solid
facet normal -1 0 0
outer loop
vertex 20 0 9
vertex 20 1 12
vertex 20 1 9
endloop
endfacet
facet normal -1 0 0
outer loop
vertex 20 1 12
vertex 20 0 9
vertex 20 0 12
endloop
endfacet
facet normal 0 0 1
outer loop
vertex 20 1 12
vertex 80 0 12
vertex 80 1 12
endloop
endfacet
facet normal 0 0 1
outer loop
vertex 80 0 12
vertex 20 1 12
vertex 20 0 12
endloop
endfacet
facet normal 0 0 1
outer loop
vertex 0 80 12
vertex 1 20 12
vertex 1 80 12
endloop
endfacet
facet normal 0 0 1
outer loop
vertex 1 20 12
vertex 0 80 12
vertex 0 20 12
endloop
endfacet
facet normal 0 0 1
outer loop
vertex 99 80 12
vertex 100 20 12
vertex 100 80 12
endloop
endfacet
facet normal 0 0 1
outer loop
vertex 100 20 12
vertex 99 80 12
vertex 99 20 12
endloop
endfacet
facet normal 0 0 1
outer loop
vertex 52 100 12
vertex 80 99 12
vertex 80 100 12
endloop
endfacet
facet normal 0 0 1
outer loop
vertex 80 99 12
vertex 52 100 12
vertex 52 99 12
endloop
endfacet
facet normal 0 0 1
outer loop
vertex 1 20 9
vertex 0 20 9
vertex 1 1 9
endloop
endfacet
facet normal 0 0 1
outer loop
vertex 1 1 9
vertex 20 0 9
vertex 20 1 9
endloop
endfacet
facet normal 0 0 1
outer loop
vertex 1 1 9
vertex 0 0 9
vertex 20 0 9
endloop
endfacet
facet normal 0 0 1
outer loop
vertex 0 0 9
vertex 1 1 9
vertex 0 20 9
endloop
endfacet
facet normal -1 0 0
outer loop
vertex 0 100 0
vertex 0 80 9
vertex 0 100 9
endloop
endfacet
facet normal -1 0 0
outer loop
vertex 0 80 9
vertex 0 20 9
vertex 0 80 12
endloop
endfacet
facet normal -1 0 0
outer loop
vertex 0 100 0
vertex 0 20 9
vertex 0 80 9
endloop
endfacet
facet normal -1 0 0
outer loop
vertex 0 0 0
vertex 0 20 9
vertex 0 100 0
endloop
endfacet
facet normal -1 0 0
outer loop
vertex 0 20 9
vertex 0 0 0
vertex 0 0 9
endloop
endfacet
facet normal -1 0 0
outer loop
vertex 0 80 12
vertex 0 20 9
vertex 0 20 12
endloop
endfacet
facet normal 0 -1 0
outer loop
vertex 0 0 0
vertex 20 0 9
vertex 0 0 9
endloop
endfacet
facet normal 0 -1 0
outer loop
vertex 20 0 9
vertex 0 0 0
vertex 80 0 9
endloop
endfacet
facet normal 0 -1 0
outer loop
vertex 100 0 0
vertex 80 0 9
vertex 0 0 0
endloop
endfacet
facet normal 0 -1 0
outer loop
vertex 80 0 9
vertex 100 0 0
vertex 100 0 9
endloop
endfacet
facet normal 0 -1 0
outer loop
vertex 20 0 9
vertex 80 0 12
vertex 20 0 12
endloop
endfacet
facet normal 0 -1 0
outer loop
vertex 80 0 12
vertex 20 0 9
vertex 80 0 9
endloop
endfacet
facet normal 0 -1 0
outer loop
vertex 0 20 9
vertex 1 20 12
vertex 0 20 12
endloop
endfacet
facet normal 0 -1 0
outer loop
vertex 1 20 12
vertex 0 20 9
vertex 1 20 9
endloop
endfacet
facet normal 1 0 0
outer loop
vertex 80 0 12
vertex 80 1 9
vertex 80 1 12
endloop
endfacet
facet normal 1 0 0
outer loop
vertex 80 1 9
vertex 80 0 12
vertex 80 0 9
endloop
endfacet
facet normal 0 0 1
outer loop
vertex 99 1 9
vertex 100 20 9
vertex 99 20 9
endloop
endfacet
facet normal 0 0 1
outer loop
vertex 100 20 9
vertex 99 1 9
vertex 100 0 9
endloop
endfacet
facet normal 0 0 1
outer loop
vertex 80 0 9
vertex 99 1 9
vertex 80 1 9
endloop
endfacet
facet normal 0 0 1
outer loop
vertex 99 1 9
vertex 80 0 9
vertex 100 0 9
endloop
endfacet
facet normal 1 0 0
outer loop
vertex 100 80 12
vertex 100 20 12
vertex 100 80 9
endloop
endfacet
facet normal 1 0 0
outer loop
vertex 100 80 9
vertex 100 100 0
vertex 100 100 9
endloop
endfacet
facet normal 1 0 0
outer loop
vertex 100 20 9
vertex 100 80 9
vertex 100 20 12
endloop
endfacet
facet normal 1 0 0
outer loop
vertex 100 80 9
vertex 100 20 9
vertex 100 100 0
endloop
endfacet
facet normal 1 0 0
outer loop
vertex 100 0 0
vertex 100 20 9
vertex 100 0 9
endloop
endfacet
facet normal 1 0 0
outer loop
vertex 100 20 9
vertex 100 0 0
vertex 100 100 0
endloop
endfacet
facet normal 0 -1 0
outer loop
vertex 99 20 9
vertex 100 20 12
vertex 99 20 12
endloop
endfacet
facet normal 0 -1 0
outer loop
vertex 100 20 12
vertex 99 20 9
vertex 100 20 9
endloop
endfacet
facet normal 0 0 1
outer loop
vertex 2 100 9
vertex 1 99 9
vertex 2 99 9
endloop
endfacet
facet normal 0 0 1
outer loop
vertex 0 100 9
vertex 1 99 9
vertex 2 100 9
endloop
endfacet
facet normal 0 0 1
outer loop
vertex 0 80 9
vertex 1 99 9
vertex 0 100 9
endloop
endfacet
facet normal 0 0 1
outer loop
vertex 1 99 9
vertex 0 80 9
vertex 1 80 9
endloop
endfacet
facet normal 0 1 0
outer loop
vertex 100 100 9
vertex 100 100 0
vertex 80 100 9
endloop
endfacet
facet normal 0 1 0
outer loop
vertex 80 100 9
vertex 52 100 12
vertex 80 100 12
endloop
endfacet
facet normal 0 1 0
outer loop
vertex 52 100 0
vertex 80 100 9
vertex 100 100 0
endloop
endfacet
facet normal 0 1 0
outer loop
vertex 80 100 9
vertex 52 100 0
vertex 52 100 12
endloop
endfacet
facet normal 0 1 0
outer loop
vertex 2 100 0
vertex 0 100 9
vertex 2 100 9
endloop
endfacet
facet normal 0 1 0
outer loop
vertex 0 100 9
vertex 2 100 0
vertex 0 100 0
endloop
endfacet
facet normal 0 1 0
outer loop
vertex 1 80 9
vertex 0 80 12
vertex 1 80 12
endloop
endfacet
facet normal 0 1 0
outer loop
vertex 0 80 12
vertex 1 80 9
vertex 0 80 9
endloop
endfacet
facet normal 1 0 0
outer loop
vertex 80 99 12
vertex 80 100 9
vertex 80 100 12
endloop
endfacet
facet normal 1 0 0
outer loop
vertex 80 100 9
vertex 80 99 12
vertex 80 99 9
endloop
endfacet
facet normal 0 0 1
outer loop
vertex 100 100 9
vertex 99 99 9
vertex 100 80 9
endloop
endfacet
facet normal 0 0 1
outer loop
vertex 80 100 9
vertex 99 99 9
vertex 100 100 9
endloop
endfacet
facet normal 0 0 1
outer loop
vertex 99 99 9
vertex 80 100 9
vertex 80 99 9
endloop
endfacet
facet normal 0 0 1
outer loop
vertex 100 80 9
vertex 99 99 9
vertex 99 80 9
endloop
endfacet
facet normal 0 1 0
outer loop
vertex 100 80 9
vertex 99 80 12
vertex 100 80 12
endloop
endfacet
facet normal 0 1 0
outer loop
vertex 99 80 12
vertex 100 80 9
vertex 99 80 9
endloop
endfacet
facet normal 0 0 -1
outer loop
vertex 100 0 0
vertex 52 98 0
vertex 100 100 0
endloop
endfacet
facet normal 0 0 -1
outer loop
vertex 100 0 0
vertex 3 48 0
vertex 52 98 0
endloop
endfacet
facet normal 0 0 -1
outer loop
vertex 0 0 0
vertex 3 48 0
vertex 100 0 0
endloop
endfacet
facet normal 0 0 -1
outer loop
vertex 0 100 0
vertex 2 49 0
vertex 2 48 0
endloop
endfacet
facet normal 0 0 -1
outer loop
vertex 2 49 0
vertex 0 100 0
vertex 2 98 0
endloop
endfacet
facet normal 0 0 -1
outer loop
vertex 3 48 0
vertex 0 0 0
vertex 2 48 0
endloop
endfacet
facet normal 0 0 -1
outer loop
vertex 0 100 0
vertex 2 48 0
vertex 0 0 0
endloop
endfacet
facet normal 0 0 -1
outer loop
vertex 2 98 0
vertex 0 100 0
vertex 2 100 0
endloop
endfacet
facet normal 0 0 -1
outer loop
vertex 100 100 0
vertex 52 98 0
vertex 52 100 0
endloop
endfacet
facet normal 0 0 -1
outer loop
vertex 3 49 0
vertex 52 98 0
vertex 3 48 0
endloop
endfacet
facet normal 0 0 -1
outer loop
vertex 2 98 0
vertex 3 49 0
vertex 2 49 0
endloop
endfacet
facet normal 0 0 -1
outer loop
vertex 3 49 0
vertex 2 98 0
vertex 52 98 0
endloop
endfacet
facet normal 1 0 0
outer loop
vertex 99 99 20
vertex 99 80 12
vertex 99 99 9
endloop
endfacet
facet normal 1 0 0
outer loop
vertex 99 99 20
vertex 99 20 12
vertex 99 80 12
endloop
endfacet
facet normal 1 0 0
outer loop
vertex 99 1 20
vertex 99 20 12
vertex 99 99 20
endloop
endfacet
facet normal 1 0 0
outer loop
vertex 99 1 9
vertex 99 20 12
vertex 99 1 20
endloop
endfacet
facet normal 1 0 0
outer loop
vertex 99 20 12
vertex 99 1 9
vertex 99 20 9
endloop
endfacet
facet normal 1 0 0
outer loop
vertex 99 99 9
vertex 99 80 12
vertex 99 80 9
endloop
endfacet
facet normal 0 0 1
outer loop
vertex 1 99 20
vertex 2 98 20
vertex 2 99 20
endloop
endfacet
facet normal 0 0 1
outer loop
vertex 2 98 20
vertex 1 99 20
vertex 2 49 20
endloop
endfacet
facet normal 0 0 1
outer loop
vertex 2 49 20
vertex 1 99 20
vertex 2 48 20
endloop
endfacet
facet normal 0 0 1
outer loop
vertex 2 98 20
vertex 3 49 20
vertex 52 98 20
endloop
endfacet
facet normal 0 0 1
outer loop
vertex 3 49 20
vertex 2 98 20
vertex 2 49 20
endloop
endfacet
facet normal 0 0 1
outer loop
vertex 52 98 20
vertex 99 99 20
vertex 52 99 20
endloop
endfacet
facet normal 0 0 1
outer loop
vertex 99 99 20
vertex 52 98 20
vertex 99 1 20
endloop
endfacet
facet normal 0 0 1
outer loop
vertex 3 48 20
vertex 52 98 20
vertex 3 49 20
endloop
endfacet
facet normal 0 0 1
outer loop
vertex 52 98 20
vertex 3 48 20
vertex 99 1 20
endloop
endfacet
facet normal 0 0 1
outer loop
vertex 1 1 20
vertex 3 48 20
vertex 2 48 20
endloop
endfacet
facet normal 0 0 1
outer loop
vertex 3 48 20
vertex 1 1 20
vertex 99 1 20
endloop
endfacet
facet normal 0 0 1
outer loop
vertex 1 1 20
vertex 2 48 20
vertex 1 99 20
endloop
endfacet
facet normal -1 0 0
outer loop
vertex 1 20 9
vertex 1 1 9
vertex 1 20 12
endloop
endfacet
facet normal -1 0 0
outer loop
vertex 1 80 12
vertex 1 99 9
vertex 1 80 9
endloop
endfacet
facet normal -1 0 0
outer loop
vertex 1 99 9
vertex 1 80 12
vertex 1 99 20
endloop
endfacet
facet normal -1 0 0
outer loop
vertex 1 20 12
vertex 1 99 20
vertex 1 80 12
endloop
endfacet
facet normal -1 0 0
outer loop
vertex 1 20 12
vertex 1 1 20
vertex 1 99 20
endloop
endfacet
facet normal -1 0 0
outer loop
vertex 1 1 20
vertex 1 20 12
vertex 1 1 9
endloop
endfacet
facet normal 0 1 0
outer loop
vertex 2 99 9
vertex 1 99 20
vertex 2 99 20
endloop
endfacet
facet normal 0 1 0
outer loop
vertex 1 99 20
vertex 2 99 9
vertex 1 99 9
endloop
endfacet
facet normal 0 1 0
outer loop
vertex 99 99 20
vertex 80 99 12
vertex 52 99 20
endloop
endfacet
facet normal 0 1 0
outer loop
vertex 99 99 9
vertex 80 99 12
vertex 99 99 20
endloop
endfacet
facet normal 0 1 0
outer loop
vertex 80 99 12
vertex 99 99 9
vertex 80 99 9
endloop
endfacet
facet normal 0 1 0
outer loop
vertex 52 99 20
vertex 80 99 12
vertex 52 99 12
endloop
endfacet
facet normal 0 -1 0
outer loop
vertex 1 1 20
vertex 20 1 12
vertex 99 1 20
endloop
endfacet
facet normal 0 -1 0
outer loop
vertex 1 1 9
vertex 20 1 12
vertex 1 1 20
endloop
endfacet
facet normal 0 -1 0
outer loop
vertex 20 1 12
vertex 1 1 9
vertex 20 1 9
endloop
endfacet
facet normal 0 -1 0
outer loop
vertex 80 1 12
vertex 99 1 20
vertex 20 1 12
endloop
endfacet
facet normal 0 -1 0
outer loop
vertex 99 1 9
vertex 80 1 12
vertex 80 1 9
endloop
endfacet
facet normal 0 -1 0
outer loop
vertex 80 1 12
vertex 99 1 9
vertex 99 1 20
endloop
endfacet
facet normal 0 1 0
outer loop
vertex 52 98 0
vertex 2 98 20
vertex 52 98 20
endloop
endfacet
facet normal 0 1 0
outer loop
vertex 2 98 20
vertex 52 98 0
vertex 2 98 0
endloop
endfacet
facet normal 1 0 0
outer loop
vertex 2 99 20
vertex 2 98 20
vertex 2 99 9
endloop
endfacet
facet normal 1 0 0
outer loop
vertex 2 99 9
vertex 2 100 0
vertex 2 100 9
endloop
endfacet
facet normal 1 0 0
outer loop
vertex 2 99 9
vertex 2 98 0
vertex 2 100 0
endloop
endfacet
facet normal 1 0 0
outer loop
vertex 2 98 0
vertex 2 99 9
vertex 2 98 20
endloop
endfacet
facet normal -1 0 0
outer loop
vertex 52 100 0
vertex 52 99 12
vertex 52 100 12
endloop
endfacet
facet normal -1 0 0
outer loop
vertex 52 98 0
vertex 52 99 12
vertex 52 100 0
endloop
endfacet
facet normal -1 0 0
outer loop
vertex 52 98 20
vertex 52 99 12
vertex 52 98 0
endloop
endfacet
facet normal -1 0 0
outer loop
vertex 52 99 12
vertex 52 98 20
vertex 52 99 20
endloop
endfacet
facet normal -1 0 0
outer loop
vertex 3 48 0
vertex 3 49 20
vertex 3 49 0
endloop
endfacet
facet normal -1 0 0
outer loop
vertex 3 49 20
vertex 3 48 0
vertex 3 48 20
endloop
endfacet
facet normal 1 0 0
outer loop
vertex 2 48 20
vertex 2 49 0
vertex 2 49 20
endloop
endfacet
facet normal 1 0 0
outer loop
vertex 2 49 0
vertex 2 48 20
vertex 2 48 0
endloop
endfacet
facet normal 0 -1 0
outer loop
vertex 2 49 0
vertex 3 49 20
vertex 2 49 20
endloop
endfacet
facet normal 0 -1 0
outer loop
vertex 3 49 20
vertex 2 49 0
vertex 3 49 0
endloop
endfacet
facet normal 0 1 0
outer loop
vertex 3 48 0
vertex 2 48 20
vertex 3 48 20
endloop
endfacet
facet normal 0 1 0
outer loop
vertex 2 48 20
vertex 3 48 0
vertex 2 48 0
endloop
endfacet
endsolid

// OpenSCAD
include <boardgame_insert_toolkit_lib.scad>;


data =
[
    [   "a card box",
        [
            [ "box_dimensions",                             [100.0, 100.0, 20.0] ],      // float f -- default:[ 100, 100, 100]
            [ "enabled",                                    true ],

            [   "components",
                [
                    [   "cards",
                        [
                            ["type",                        ""],                   // "cards" | "tokens" | "chit_stack" | "" -- default: ""
                            ["compartment_size",            [ 20, 50.0, 20.0] ],        // float f -- default:[ 10, 10, 10]
                            ["num_compartments",            [1, 1] ],                   // int i -- default: [1, 1]
                            ["enabled",                     true ],                     // true | false
                            ["rotation",                    90 ],                        // 0 | 90 | -90 | 180
                            ["position",                    [0,"max"]]        // float f | "center" | "max" -- default: "center"
                        ]
                    ],
                ]
            ]
        ]
    ],
];


// for printing control.
b_print_lid = false;
b_print_box = true;

//b_print_box = "a vertical chit stack"; // isolate one box to print

MakeAll();
